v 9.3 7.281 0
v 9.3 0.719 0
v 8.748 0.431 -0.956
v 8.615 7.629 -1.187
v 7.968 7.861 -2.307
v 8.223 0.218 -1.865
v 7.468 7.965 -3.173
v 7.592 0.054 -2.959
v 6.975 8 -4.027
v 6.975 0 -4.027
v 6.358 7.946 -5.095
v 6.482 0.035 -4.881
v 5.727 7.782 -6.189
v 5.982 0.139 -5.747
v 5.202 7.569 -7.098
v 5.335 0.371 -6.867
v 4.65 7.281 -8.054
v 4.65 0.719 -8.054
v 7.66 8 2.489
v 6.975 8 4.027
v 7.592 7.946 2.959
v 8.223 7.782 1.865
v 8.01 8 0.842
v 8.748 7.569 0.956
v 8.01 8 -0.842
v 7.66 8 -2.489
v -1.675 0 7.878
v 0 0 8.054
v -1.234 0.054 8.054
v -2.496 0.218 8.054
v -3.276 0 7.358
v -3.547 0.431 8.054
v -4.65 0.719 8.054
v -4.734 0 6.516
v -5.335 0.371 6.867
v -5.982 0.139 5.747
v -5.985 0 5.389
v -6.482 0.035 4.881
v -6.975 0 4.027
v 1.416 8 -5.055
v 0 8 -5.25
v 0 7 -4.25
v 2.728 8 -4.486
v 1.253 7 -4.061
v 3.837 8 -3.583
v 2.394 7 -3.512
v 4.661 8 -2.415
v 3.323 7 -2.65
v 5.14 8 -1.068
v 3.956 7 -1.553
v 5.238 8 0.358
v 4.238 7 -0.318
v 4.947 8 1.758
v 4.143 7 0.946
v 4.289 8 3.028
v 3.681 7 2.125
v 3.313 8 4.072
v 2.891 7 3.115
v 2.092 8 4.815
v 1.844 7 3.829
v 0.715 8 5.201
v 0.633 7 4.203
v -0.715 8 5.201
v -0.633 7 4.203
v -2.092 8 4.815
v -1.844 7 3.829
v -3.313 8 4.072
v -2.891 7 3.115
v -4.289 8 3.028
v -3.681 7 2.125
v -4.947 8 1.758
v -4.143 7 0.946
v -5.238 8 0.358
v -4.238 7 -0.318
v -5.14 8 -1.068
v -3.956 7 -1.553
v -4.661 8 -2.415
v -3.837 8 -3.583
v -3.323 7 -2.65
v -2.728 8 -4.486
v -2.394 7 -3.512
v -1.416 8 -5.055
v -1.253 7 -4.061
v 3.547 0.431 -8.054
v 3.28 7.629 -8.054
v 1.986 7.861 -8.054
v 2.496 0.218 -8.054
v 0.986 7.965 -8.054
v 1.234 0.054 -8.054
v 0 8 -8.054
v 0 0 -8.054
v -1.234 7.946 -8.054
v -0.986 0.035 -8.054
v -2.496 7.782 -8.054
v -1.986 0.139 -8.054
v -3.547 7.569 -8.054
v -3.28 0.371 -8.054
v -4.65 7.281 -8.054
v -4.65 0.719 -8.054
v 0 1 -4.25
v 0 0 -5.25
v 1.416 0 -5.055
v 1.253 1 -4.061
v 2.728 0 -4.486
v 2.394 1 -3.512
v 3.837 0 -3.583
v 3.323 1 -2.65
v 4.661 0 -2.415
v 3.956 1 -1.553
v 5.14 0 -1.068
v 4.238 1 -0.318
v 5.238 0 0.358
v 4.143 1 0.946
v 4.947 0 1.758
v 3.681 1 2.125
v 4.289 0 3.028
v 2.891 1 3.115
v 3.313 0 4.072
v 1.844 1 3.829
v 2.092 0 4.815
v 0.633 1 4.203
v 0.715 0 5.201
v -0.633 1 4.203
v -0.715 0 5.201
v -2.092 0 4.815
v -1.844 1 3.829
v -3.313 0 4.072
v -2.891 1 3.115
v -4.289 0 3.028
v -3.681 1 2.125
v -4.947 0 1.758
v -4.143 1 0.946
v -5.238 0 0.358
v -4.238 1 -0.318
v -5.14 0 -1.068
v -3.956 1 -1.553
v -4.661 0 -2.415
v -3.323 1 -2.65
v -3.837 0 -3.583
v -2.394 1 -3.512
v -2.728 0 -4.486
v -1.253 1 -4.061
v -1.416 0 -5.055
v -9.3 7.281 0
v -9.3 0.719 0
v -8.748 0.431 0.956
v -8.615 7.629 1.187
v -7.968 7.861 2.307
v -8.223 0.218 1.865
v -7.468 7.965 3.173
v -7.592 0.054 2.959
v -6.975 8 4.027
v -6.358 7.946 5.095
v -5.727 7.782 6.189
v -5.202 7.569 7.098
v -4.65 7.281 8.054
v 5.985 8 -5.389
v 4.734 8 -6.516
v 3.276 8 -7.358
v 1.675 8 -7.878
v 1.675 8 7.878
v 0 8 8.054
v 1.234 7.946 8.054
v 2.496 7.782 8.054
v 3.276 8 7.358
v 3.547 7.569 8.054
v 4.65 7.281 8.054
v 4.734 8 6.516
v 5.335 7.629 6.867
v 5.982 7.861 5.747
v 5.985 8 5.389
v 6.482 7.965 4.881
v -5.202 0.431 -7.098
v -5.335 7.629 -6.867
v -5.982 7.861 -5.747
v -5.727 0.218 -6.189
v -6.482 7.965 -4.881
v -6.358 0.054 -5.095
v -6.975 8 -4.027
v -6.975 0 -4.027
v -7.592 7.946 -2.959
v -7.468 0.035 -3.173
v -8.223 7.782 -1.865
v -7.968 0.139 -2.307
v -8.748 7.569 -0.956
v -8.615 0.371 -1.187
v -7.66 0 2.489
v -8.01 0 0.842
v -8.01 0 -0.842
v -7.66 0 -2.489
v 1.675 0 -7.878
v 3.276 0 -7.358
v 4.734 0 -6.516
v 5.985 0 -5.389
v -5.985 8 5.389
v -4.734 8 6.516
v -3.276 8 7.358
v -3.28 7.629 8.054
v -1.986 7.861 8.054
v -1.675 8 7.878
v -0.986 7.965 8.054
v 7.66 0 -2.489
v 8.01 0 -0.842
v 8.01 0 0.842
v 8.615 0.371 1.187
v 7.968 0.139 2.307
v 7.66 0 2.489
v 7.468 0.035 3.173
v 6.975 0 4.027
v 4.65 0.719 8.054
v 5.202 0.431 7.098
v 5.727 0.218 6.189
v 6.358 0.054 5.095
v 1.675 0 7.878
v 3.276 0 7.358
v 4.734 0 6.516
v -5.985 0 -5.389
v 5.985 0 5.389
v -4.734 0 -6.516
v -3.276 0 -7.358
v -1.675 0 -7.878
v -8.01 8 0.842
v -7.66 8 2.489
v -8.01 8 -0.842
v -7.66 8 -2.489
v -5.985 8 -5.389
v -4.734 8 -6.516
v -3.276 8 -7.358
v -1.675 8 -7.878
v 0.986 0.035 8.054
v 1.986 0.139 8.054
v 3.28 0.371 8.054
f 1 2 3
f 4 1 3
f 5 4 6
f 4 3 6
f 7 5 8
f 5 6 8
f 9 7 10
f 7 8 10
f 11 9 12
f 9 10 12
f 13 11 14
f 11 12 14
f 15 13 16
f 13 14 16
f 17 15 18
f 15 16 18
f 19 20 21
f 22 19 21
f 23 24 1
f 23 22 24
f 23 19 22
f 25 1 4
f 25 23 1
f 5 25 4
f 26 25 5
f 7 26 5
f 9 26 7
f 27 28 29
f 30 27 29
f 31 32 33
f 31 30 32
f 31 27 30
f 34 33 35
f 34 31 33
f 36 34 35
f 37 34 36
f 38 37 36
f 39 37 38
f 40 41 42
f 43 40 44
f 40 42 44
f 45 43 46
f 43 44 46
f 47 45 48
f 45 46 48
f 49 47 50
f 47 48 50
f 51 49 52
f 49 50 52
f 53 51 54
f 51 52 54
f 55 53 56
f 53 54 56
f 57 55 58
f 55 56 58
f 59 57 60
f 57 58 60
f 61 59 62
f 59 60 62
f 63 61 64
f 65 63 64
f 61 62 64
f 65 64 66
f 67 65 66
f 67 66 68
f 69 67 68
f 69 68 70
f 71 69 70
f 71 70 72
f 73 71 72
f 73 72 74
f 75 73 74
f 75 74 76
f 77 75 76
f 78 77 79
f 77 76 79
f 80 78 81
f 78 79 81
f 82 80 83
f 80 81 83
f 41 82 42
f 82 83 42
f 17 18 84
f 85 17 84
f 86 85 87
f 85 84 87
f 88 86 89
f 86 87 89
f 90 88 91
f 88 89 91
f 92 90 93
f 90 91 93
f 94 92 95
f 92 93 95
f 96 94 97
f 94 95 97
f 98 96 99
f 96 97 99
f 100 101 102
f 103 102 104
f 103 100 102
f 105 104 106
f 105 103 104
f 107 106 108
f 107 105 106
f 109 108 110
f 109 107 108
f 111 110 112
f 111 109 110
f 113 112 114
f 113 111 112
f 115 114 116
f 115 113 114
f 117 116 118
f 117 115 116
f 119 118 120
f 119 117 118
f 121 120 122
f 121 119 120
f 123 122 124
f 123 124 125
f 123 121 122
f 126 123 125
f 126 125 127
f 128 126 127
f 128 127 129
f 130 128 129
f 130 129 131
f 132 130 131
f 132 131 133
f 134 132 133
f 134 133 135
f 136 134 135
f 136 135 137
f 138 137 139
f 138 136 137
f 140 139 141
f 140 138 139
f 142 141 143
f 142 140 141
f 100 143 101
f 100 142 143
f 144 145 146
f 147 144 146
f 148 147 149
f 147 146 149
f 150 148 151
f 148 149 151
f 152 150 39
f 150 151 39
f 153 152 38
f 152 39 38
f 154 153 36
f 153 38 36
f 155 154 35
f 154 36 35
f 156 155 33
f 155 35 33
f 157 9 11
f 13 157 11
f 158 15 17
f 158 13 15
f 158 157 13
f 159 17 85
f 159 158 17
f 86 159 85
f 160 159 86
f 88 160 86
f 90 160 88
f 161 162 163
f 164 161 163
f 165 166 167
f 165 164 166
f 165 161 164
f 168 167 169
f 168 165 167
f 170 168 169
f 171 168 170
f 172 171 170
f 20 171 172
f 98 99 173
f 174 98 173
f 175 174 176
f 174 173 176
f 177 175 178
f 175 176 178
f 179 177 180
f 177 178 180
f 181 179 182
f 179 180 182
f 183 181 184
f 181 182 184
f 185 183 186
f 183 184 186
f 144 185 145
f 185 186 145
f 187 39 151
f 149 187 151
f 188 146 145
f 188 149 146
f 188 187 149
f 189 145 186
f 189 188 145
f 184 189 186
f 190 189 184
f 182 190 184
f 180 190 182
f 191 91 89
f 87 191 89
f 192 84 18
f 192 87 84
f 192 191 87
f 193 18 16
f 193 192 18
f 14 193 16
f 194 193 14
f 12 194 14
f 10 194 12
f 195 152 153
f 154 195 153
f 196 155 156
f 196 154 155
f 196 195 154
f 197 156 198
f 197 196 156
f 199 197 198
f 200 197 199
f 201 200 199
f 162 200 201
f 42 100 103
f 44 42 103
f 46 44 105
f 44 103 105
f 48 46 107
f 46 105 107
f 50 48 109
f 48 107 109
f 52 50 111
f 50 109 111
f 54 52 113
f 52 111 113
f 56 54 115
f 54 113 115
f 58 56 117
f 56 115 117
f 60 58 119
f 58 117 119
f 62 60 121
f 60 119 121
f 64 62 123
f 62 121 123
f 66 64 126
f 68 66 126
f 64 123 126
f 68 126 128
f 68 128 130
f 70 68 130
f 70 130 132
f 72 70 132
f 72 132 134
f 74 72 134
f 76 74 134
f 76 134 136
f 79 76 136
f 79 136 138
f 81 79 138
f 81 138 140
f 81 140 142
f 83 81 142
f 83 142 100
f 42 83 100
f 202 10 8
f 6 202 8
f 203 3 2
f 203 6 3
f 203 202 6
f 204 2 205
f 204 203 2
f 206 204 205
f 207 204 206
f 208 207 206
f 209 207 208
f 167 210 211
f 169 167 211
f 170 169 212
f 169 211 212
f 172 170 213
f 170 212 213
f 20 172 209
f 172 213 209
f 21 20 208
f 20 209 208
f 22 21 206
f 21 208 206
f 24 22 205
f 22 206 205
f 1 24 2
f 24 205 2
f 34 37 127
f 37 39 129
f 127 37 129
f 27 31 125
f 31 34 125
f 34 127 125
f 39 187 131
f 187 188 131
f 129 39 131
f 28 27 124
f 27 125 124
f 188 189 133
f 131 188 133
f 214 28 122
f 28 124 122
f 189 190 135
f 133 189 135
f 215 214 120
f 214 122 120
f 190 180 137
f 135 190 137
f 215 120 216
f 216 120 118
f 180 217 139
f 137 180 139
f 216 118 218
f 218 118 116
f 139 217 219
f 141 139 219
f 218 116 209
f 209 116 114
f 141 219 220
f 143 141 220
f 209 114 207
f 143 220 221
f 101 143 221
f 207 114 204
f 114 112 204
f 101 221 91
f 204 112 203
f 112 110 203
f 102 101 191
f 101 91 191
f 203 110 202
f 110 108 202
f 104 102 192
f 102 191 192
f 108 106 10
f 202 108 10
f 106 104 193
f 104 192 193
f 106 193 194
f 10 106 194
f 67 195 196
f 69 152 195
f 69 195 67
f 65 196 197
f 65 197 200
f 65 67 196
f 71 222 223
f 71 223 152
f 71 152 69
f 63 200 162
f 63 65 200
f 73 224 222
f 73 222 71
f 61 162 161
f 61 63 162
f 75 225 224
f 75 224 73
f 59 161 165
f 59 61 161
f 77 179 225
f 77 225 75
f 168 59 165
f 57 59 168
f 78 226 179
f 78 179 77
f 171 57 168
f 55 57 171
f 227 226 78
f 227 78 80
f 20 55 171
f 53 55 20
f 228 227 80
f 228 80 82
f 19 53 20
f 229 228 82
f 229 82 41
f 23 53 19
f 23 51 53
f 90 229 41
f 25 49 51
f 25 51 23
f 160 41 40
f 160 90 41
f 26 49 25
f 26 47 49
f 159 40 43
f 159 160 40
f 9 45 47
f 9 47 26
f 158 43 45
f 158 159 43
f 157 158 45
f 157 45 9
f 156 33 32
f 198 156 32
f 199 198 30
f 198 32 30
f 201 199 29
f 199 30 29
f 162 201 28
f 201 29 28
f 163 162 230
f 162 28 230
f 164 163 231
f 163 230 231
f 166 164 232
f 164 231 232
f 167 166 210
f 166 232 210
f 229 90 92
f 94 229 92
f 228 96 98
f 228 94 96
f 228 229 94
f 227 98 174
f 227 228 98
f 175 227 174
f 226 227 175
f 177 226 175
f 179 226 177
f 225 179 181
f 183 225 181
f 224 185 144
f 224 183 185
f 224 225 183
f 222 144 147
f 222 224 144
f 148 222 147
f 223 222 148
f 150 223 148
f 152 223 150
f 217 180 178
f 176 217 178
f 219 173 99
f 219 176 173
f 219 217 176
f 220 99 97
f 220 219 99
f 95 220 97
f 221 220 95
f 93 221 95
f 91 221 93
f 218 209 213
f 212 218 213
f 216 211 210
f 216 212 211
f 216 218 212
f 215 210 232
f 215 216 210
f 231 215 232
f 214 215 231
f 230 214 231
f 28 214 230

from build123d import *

# Parameters (mm, degrees)
EXTRUDE_1_DEPTH     = 8
SKETCH_2_OUTSIDE_W  = 53.488
SKETCH_2_OUTSIDE_H  = 50.996
SKETCH_2_OUTSIDE_R  = 8.054036255
CUT_EXTRUDE_2_DEPTH = 8
CUT_EXTRUDE_2_DRAFT = -60
SKETCH_3_OUTSIDE_W  = 53.488
SKETCH_3_OUTSIDE_H  = 50.996
SKETCH_3_OUTSIDE_R  = 8.054036255
CUT_EXTRUDE_3_DEPTH = 8
CUT_EXTRUDE_3_DRAFT = -60
SKETCH_4_R          = 4.25
CUT_EXTRUDE_4_DEPTH = 15.675063884
CHAMFER_1_SIZE      = 1


with BuildPart() as part:
    # Эскиз1 → Бобышка-Вытянуть1 (new body)
    with BuildSketch(Plane(origin=(0, 0, 0), x_dir=(1, 0, 0), z_dir=(0, 1, 0))):
        Polygon((9.3, 0), (4.65, 8.054036255), (-4.65, 8.054036255), (-9.3, 0), (-4.65, -8.054036255), (4.65, -8.054036255), align=None)
    extrude(amount=EXTRUDE_1_DEPTH)


with BuildPart() as cut_extrude_2_tool:
    # Эскиз2 outside → Вырез-Вытянуть2 (with draft: the straight prism first)
    with BuildSketch(Plane(origin=(0, 8, 0), x_dir=(1, 0, 0), z_dir=(0, 1, 0))):
        Rectangle(SKETCH_2_OUTSIDE_W, SKETCH_2_OUTSIDE_H)
        Circle(SKETCH_2_OUTSIDE_R, mode=Mode.SUBTRACT)
    extrude(amount=-CUT_EXTRUDE_2_DEPTH)
    # Вырез-Вытянуть2: the draft: its side faces are tilted about the plane it starts from
    cut_extrude_2_sides = [cut_extrude_2_tool.faces().sort_by_distance(p)[0] for p in [
        (0, 4, 25.498),
        (26.744, 4, 0),
        (0, 4, -25.498),
        (-26.744, 4, 0),
        (-8.054036255, 4, 0),
    ]]
    draft(cut_extrude_2_sides, Plane(origin=(0, 8, 0), x_dir=(1, 0, 0), z_dir=(0, 1, 0)), CUT_EXTRUDE_2_DRAFT)


with BuildPart() as part_1:
    add(part.part)

    # Вырез-Вытянуть2: cut by cut_extrude_2_tool
    add(cut_extrude_2_tool.part, mode=Mode.SUBTRACT)


with BuildPart() as cut_extrude_3_tool:
    # Эскиз3 outside → Вырез-Вытянуть3 (with draft: the straight prism first)
    with BuildSketch(Plane.XZ):
        Rectangle(SKETCH_3_OUTSIDE_W, SKETCH_3_OUTSIDE_H)
        Circle(SKETCH_3_OUTSIDE_R, mode=Mode.SUBTRACT)
    extrude(amount=-CUT_EXTRUDE_3_DEPTH)
    # Вырез-Вытянуть3: the draft: its side faces are tilted about the plane it starts from
    cut_extrude_3_sides = [cut_extrude_3_tool.faces().sort_by_distance(p)[0] for p in [
        (0, 4, -25.498),
        (26.744, 4, 0),
        (0, 4, 25.498),
        (-26.744, 4, 0),
        (-8.054036255, 4, 0),
    ]]
    draft(cut_extrude_3_sides, Plane.XZ, CUT_EXTRUDE_3_DRAFT)


with BuildPart() as part_2:
    add(part_1.part)

    # Вырез-Вытянуть3: cut by cut_extrude_3_tool
    add(cut_extrude_3_tool.part, mode=Mode.SUBTRACT)

    # Эскиз4 → Вырез-Вытянуть4 (cut, through all)
    with BuildSketch(Plane.XZ):
        with Locations(Location((0, 0, 0), (0, 0, 270))):
            Circle(SKETCH_4_R)
    extrude(amount=-CUT_EXTRUDE_4_DEPTH, mode=Mode.SUBTRACT)

    # Фаска1
    chamfer_1_edges = [part_2.edges().sort_by_distance(p)[0] for p in [
        (0, 8, 4.25),
        (0, 0, 4.25),
    ]]
    chamfer(chamfer_1_edges, length=CHAMFER_1_SIZE)


solid = part_2.part
